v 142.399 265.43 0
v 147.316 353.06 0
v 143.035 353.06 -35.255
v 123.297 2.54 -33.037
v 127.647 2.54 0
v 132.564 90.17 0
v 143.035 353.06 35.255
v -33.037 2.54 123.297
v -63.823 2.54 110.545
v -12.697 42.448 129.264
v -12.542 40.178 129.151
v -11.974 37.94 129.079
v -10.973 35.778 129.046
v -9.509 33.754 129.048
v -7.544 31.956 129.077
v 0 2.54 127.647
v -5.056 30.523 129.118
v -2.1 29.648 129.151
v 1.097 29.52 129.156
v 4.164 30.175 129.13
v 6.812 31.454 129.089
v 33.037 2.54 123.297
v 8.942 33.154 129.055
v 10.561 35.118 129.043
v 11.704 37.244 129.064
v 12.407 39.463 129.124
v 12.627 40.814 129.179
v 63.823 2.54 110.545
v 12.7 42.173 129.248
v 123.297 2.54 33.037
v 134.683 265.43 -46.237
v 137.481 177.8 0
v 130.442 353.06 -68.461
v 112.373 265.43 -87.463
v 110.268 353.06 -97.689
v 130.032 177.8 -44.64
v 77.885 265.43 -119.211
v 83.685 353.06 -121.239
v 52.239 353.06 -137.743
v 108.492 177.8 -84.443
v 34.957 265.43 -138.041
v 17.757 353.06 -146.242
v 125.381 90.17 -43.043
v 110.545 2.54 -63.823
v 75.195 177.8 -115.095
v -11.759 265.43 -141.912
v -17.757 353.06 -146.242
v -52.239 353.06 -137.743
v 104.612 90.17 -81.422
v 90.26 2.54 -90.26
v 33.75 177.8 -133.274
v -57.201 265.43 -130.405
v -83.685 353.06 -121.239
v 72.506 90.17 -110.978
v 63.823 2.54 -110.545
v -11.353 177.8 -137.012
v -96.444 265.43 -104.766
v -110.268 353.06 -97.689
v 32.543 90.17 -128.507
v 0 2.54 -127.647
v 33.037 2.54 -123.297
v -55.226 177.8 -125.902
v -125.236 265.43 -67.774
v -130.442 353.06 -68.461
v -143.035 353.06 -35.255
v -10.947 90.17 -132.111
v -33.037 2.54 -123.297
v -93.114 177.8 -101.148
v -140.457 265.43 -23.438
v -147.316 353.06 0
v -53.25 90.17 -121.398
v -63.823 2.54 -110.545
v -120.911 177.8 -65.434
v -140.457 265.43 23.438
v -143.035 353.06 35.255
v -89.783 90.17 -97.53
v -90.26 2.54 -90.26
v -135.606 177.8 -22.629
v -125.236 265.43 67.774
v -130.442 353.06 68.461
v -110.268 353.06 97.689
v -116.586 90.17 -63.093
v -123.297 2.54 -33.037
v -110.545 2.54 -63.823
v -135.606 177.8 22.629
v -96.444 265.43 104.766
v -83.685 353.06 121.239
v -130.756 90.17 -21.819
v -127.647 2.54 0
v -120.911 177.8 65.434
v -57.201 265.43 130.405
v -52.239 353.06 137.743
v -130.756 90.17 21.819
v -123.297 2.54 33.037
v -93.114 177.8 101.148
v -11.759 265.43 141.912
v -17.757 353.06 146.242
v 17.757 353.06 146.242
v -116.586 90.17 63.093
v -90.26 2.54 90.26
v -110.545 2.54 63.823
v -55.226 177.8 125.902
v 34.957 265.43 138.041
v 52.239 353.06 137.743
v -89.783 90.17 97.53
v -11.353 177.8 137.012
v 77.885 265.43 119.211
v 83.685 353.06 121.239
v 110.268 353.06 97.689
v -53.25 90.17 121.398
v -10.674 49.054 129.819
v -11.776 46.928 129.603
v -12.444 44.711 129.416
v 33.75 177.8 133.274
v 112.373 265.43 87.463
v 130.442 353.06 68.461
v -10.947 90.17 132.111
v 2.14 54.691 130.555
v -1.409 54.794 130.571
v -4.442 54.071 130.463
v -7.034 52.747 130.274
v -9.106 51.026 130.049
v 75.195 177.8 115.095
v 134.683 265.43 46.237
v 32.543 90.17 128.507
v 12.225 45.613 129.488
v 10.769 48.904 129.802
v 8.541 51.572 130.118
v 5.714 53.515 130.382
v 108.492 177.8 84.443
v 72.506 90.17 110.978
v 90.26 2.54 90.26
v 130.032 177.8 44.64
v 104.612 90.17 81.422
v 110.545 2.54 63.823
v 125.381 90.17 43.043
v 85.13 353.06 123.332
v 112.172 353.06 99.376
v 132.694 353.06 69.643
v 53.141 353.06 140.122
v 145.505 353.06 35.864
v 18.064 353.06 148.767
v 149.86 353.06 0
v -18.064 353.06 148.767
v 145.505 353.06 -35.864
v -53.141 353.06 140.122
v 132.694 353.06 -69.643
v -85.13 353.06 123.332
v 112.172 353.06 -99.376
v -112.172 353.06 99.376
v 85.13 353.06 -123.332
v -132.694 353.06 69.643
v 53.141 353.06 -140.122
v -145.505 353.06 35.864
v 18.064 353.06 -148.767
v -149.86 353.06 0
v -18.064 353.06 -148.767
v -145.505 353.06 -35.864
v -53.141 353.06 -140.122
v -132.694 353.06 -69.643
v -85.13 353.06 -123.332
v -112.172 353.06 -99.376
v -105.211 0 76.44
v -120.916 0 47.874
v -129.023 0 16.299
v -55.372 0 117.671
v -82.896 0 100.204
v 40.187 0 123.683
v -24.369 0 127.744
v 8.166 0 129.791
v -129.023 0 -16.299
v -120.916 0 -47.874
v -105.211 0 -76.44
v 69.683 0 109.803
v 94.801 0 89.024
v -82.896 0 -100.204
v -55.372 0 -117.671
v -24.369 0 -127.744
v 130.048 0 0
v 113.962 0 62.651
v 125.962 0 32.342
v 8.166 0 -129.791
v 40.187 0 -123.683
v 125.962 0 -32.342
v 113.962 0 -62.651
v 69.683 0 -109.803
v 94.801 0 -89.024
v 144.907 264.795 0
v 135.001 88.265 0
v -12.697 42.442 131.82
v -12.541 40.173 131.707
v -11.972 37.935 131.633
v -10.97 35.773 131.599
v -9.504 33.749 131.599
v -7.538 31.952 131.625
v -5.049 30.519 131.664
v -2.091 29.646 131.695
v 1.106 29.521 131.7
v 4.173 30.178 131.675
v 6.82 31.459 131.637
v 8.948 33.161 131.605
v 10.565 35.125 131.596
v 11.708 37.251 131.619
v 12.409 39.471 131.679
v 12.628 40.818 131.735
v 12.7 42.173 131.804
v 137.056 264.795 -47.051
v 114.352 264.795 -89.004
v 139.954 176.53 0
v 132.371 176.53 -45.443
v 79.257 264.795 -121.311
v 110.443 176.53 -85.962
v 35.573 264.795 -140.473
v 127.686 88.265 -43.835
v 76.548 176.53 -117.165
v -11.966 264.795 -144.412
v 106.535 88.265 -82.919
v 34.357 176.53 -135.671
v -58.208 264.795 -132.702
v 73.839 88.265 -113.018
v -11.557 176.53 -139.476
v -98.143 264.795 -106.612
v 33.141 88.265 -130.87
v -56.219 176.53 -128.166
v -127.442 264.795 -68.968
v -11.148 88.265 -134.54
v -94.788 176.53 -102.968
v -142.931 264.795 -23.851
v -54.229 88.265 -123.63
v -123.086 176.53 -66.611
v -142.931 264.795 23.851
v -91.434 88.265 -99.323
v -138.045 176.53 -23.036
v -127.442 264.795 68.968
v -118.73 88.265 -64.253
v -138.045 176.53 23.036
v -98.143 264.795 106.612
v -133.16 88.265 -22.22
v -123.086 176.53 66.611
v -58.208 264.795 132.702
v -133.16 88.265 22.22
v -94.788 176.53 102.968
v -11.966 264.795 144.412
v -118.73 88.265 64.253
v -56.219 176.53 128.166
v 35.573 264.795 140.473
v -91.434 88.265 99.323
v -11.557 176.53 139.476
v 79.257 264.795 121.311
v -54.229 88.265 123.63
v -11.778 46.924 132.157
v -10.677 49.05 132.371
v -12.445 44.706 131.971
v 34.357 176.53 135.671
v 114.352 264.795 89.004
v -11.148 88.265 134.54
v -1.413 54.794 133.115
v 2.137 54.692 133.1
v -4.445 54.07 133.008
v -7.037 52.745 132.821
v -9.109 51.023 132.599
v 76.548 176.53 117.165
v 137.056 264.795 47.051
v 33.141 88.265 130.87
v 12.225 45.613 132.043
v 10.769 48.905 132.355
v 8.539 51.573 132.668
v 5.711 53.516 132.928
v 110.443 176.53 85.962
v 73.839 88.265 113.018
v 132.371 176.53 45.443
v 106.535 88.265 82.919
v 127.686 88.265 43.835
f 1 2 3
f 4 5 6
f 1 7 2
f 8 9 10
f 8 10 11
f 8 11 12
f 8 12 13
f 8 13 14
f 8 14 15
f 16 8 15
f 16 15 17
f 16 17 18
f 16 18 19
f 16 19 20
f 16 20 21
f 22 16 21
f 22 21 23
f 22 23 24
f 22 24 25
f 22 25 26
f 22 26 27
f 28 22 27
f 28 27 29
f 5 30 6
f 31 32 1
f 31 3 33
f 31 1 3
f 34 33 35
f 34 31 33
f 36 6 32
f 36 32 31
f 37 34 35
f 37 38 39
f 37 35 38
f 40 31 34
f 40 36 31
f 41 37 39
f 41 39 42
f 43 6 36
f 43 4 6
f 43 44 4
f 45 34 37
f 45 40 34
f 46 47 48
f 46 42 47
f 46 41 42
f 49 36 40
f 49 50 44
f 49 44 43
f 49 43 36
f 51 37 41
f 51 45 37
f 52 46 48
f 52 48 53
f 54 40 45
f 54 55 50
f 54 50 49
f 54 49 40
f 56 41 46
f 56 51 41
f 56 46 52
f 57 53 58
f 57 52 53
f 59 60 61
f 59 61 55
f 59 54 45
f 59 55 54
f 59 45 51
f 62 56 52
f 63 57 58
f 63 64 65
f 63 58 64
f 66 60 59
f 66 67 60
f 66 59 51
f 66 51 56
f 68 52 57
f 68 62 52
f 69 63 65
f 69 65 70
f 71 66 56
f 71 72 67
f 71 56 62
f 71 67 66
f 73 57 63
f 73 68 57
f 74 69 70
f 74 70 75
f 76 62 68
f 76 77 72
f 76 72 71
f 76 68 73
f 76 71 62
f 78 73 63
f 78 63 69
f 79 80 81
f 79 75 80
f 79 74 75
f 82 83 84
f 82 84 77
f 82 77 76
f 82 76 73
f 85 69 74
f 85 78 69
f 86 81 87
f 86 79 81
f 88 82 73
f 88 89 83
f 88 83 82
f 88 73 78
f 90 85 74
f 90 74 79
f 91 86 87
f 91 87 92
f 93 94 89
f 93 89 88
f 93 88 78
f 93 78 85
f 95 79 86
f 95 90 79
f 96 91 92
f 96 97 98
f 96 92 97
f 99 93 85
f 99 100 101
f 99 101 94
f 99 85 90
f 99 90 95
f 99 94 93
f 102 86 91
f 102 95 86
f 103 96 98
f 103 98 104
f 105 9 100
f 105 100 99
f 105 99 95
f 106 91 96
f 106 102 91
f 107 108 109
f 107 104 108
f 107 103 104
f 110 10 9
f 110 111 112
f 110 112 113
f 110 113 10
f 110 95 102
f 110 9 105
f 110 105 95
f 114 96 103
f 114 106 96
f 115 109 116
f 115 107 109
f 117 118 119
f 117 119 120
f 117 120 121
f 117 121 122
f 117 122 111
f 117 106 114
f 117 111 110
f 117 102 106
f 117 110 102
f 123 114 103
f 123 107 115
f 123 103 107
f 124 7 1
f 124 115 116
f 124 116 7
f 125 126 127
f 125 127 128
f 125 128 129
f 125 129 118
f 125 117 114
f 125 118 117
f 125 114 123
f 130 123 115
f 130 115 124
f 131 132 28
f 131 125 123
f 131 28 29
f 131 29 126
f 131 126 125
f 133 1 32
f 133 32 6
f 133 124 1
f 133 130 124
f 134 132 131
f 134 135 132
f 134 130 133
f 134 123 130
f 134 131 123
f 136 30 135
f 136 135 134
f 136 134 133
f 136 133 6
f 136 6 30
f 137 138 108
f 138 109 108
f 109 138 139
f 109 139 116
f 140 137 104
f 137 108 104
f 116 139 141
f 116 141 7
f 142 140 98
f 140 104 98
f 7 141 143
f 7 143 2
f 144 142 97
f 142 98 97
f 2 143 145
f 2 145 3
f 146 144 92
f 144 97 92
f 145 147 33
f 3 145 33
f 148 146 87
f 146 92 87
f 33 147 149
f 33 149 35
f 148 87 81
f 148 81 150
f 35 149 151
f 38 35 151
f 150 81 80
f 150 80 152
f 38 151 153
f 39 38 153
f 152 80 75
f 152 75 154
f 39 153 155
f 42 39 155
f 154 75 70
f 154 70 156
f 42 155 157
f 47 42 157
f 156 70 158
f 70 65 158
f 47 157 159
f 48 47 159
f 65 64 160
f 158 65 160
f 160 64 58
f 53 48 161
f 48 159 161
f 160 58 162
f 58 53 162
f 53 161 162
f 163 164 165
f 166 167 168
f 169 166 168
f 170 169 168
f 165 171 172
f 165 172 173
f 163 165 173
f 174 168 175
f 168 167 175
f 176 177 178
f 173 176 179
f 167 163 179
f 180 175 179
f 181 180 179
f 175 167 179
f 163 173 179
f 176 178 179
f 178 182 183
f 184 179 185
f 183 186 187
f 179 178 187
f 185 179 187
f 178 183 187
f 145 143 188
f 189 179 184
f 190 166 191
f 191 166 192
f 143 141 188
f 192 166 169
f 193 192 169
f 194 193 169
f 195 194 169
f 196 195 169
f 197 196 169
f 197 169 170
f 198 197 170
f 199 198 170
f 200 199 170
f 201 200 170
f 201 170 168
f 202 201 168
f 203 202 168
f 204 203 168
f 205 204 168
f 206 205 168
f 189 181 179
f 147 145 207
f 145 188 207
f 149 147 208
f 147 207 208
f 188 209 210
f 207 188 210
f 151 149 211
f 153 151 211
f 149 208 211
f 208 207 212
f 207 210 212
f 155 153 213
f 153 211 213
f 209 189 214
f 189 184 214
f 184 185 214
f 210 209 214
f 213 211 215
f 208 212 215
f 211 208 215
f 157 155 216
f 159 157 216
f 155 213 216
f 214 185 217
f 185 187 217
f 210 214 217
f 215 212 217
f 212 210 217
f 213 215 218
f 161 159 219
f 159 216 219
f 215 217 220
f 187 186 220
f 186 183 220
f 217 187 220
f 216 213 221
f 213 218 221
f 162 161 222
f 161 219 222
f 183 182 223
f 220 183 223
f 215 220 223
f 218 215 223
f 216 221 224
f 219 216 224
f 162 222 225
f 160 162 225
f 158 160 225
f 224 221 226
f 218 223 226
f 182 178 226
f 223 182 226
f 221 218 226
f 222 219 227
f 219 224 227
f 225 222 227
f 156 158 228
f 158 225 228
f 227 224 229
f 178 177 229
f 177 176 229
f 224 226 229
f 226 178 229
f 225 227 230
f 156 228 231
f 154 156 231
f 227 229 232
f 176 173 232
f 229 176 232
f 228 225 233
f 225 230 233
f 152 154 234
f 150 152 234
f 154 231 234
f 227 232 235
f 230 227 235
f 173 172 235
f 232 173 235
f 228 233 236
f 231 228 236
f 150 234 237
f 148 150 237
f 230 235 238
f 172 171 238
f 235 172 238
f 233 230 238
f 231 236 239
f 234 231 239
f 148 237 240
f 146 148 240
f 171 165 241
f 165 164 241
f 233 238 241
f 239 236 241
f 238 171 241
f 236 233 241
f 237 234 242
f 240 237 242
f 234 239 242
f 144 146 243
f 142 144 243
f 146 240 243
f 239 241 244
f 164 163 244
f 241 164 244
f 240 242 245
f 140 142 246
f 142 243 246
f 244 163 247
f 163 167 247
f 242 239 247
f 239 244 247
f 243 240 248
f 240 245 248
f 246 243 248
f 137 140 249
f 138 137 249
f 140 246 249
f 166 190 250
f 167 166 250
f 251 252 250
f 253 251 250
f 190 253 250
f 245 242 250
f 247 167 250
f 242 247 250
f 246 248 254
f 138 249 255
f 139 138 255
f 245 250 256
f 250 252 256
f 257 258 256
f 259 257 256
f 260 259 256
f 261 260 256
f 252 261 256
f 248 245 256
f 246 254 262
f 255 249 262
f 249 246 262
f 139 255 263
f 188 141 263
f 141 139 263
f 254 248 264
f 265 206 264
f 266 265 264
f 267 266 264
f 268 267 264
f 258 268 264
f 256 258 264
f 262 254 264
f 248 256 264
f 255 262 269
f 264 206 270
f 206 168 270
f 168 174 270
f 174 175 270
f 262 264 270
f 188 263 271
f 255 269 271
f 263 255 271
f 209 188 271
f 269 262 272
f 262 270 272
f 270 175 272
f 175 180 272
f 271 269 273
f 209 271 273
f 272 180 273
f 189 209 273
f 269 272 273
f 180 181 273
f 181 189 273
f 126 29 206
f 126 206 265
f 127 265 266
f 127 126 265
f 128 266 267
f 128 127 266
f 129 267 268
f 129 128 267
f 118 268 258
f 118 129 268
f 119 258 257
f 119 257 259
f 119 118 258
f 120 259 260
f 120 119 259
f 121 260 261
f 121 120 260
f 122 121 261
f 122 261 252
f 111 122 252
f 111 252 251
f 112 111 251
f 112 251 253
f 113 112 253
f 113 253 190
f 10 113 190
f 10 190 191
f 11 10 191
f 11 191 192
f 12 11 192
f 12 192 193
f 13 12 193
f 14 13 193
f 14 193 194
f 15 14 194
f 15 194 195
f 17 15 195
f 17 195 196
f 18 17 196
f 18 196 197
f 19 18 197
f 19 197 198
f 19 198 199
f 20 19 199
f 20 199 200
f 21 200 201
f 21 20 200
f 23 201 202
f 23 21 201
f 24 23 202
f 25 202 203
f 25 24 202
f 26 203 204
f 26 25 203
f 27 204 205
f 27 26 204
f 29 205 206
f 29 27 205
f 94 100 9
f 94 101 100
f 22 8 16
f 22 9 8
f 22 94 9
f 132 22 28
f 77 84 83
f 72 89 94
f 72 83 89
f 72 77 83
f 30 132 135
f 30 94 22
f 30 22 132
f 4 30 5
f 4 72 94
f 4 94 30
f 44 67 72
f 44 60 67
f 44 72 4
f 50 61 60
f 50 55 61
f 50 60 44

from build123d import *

# Parameters (mm, degrees)
SHELL1_T           = -2.54
CUT_EXTRUDE1_REACH = 151.86
SKETCH2_R          = 12.7


with BuildPart() as part:
    # Sketch1 → Revolve1 (revolve)
    with BuildSketch(Plane.XY):
        Polygon((0, 0), (0, 353.06), (149.86, 353.06), (130.048, 0), align=None)
    revolve(axis=Axis((0, 0, 0), (0, 1, 0)))

    # Shell1
    shell1_openings = [part.faces().sort_by_distance(p)[0] for p in [
        (0, 353.06, -149.86),
    ]]
    offset(amount=SHELL1_T, openings=shell1_openings, kind=Kind.INTERSECTION)

    # Sketch2 → Cut-Extrude1 (cut, up to next)
    with BuildSketch(Plane.XY, mode=Mode.PRIVATE) as cut_extrude1_sk1:
        with Locations((0, 42.17291268)):
            Circle(SKETCH2_R)
    cut_extrude1_tool1 = extrude(cut_extrude1_sk1.sketch, amount=CUT_EXTRUDE1_REACH, mode=Mode.PRIVATE) & part.part
    add(cut_extrude1_tool1.solids().sort_by_distance((0, 42.172913, 0))[0], mode=Mode.SUBTRACT)


solid = part.part
